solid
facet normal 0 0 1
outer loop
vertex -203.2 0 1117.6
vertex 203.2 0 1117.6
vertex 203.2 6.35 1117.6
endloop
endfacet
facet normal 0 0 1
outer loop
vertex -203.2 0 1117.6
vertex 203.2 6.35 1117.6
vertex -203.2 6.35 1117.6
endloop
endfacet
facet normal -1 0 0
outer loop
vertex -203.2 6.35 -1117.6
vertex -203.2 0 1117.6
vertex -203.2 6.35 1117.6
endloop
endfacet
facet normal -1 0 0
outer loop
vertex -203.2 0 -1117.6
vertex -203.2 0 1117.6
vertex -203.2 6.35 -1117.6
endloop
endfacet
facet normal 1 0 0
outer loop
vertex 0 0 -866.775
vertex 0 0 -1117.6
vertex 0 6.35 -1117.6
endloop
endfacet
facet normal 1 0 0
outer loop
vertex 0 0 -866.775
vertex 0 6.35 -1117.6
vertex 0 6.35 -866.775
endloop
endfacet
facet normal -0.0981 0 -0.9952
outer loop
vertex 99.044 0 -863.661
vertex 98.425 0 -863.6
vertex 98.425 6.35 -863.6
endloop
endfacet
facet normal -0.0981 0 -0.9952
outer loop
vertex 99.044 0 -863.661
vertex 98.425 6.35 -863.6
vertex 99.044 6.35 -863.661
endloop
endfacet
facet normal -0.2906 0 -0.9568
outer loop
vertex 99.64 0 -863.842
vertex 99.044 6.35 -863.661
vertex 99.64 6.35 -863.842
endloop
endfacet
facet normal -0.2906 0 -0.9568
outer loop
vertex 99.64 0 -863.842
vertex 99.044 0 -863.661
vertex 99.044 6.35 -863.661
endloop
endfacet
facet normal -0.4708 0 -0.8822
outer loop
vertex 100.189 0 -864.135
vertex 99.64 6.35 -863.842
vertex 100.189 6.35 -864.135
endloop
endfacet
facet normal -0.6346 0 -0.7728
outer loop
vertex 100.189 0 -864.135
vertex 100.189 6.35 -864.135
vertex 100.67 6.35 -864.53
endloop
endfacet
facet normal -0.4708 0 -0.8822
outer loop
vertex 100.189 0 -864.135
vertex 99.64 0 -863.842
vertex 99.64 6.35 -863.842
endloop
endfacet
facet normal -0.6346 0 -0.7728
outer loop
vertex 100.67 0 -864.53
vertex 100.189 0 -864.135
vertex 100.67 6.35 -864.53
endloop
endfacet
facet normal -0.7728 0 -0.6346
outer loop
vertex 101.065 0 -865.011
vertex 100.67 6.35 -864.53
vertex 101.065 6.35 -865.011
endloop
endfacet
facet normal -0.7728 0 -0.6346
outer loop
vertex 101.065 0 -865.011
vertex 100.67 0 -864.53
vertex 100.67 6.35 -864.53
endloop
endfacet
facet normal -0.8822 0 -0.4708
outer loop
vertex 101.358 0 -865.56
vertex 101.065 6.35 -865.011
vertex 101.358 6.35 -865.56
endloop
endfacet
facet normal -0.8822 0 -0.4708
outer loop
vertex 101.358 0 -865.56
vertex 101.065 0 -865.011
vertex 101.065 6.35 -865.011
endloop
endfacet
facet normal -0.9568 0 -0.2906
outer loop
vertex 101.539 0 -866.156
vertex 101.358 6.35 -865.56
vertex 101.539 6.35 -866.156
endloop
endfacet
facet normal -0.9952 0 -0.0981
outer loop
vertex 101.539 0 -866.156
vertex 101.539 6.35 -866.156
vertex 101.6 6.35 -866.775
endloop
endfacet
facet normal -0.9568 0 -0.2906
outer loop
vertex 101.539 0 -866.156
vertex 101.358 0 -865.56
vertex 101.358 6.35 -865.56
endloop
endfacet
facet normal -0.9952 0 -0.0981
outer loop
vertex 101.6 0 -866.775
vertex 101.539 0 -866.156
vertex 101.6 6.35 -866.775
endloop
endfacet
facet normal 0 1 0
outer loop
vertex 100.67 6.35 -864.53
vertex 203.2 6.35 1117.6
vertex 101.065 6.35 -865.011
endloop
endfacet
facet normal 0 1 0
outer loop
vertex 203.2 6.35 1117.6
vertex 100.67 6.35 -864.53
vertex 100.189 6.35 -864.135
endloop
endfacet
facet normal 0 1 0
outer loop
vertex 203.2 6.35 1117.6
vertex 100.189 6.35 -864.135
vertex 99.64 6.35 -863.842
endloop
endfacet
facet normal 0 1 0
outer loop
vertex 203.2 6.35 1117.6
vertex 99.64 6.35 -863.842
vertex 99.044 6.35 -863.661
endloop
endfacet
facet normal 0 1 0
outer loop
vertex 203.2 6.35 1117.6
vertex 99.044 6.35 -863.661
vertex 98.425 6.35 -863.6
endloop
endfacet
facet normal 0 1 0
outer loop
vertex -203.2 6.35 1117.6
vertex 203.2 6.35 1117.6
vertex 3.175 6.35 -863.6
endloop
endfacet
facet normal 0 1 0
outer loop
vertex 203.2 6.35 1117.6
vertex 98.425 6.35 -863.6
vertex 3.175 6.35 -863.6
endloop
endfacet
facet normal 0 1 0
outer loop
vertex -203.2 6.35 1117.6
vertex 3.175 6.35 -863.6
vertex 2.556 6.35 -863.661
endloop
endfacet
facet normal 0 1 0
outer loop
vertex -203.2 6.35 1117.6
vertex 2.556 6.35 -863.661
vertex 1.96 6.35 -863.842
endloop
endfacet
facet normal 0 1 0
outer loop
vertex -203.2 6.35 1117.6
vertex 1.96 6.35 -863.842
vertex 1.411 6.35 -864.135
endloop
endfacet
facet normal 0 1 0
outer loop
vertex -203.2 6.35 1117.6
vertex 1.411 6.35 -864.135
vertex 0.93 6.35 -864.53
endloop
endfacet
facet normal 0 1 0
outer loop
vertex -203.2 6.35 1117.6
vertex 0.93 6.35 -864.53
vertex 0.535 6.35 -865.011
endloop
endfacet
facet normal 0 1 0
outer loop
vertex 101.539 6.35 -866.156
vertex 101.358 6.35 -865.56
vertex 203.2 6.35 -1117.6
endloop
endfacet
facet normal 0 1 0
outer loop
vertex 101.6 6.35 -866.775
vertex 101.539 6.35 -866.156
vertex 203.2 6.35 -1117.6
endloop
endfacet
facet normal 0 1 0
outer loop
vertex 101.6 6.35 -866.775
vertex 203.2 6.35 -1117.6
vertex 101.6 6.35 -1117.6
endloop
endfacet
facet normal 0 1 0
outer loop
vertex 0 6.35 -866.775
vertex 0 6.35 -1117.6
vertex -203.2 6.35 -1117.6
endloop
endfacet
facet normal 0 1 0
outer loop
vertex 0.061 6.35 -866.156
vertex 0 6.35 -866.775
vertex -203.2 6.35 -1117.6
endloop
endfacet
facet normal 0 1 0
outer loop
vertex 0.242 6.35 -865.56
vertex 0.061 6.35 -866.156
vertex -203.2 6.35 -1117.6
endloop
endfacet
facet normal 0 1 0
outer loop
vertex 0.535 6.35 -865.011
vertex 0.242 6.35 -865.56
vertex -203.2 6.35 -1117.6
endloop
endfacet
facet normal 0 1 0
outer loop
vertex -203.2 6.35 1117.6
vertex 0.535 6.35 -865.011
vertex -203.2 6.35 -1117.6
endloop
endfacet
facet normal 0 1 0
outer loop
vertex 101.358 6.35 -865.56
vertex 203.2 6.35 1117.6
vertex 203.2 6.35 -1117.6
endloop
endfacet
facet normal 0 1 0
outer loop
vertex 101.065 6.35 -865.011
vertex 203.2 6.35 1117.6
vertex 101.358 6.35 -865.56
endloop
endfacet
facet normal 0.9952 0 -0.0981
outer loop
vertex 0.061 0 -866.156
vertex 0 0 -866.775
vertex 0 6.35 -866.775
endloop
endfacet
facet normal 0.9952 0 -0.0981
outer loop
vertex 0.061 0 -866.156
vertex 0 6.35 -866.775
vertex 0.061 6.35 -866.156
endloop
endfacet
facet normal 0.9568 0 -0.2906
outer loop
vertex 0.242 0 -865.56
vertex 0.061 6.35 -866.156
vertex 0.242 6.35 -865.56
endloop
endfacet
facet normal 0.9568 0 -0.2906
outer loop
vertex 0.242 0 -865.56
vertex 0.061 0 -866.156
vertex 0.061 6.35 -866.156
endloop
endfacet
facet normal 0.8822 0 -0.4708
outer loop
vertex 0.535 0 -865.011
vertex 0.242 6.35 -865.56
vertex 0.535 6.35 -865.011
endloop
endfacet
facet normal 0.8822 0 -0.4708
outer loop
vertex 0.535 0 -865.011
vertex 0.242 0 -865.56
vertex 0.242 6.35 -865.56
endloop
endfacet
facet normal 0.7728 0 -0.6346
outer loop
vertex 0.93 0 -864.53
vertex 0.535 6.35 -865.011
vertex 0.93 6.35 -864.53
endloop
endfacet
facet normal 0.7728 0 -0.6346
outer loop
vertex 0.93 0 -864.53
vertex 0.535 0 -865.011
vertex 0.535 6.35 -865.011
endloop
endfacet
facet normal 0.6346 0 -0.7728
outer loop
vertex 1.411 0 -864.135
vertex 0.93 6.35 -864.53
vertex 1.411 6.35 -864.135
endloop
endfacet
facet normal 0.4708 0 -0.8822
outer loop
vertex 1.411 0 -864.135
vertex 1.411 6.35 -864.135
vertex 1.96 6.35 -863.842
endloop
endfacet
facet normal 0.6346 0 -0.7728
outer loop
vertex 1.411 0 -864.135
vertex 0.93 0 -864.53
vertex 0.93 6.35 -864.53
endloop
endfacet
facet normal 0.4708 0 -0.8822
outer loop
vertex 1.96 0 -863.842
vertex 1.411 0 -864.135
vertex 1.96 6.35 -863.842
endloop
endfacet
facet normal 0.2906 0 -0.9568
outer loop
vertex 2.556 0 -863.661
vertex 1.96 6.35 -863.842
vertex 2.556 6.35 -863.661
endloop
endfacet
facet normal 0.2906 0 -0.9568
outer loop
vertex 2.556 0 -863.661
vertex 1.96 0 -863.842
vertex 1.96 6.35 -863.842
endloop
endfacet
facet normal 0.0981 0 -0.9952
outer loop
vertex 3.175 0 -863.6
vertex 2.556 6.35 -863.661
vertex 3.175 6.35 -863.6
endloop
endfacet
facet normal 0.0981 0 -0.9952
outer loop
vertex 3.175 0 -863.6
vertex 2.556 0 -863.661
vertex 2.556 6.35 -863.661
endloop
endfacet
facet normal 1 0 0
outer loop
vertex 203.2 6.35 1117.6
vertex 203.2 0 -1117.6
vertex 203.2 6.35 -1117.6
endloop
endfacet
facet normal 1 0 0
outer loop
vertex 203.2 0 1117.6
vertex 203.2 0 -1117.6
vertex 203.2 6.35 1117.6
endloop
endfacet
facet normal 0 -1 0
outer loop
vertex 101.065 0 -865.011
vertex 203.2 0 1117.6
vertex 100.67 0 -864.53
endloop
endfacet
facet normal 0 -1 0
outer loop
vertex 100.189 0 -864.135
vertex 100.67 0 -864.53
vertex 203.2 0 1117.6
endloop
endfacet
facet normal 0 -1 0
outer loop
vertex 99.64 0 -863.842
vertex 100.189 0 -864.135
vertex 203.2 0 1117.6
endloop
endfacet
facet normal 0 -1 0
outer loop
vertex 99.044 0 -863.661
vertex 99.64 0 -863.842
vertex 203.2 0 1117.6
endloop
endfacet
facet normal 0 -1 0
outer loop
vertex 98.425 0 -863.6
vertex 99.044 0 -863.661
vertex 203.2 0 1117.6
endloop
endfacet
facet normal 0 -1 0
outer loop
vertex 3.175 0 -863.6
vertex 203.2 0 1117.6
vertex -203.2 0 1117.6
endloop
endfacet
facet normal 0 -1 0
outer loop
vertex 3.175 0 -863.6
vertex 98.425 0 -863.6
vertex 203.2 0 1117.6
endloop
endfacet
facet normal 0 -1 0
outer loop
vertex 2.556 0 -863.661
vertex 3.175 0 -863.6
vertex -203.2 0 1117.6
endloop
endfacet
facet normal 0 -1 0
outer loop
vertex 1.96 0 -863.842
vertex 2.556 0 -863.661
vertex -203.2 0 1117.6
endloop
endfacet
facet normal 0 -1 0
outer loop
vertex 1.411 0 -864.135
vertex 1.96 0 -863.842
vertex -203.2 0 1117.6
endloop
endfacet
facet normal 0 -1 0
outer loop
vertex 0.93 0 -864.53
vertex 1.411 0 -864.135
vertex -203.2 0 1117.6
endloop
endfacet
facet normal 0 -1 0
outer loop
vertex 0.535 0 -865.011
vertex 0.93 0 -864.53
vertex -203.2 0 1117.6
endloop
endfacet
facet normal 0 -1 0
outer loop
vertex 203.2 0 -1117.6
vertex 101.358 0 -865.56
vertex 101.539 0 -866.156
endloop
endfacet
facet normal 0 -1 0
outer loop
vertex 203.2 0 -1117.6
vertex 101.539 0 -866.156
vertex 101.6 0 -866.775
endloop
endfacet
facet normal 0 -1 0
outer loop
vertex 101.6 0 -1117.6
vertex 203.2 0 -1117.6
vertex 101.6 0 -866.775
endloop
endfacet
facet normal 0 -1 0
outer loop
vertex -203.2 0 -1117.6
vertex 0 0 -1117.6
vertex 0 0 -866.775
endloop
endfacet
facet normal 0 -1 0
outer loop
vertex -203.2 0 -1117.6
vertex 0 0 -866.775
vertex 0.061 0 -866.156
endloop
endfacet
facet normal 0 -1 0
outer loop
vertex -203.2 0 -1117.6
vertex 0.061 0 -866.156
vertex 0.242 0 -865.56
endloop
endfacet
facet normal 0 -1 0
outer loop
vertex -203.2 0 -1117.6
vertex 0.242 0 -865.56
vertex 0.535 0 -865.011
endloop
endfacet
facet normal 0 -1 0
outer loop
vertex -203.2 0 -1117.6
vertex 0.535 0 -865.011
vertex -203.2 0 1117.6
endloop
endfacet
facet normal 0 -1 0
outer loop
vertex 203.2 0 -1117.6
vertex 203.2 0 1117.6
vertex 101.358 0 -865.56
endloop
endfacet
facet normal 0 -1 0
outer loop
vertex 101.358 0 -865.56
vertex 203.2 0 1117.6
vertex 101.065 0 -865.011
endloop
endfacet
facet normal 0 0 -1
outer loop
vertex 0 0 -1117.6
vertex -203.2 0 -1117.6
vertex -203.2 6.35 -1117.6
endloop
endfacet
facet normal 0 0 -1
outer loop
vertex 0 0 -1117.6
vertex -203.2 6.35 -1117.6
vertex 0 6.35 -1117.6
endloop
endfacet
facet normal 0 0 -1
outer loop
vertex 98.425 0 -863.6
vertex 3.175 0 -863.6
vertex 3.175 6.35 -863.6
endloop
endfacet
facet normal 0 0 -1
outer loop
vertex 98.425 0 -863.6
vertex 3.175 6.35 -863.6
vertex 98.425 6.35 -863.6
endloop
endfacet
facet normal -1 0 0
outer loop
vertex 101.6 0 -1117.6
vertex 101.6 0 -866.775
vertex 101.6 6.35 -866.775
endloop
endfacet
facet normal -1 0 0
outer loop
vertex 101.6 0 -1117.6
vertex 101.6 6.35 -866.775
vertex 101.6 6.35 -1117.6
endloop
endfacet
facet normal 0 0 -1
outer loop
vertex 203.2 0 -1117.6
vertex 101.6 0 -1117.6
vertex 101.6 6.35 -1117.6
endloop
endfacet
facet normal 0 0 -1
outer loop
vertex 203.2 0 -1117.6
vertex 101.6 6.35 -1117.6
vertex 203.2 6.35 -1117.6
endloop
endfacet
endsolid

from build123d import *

# Parameters (mm, degrees)
BOSS_EXTRUDE1_DEPTH = 6.35


with BuildPart() as part:
    # Sketch1 → Boss-Extrude1 (new body)
    with BuildSketch(Plane(origin=(0, 0, 0), x_dir=(1, 0, 0), z_dir=(0, 1, 0))):
        with BuildLine():
            Line((0, 1117.6), (0, 866.775))
            ThreePointArc((0, 866.775), (0.92993597, 864.52993597), (3.175, 863.6))
            Line((3.175, 863.6), (98.425, 863.6))
            ThreePointArc((98.425, 863.6), (100.67006403, 864.52993597), (101.6, 866.775))
            Line((101.6, 866.775), (101.6, 1117.6))
            Line((101.6, 1117.6), (203.2, 1117.6))
            Line((203.2, 1117.6), (203.2, -1117.6))
            Line((203.2, -1117.6), (-203.2, -1117.6))
            Line((-203.2, -1117.6), (-203.2, 1117.6))
            Line((-203.2, 1117.6), (0, 1117.6))
        make_face()
    extrude(amount=BOSS_EXTRUDE1_DEPTH)


solid = part.part
